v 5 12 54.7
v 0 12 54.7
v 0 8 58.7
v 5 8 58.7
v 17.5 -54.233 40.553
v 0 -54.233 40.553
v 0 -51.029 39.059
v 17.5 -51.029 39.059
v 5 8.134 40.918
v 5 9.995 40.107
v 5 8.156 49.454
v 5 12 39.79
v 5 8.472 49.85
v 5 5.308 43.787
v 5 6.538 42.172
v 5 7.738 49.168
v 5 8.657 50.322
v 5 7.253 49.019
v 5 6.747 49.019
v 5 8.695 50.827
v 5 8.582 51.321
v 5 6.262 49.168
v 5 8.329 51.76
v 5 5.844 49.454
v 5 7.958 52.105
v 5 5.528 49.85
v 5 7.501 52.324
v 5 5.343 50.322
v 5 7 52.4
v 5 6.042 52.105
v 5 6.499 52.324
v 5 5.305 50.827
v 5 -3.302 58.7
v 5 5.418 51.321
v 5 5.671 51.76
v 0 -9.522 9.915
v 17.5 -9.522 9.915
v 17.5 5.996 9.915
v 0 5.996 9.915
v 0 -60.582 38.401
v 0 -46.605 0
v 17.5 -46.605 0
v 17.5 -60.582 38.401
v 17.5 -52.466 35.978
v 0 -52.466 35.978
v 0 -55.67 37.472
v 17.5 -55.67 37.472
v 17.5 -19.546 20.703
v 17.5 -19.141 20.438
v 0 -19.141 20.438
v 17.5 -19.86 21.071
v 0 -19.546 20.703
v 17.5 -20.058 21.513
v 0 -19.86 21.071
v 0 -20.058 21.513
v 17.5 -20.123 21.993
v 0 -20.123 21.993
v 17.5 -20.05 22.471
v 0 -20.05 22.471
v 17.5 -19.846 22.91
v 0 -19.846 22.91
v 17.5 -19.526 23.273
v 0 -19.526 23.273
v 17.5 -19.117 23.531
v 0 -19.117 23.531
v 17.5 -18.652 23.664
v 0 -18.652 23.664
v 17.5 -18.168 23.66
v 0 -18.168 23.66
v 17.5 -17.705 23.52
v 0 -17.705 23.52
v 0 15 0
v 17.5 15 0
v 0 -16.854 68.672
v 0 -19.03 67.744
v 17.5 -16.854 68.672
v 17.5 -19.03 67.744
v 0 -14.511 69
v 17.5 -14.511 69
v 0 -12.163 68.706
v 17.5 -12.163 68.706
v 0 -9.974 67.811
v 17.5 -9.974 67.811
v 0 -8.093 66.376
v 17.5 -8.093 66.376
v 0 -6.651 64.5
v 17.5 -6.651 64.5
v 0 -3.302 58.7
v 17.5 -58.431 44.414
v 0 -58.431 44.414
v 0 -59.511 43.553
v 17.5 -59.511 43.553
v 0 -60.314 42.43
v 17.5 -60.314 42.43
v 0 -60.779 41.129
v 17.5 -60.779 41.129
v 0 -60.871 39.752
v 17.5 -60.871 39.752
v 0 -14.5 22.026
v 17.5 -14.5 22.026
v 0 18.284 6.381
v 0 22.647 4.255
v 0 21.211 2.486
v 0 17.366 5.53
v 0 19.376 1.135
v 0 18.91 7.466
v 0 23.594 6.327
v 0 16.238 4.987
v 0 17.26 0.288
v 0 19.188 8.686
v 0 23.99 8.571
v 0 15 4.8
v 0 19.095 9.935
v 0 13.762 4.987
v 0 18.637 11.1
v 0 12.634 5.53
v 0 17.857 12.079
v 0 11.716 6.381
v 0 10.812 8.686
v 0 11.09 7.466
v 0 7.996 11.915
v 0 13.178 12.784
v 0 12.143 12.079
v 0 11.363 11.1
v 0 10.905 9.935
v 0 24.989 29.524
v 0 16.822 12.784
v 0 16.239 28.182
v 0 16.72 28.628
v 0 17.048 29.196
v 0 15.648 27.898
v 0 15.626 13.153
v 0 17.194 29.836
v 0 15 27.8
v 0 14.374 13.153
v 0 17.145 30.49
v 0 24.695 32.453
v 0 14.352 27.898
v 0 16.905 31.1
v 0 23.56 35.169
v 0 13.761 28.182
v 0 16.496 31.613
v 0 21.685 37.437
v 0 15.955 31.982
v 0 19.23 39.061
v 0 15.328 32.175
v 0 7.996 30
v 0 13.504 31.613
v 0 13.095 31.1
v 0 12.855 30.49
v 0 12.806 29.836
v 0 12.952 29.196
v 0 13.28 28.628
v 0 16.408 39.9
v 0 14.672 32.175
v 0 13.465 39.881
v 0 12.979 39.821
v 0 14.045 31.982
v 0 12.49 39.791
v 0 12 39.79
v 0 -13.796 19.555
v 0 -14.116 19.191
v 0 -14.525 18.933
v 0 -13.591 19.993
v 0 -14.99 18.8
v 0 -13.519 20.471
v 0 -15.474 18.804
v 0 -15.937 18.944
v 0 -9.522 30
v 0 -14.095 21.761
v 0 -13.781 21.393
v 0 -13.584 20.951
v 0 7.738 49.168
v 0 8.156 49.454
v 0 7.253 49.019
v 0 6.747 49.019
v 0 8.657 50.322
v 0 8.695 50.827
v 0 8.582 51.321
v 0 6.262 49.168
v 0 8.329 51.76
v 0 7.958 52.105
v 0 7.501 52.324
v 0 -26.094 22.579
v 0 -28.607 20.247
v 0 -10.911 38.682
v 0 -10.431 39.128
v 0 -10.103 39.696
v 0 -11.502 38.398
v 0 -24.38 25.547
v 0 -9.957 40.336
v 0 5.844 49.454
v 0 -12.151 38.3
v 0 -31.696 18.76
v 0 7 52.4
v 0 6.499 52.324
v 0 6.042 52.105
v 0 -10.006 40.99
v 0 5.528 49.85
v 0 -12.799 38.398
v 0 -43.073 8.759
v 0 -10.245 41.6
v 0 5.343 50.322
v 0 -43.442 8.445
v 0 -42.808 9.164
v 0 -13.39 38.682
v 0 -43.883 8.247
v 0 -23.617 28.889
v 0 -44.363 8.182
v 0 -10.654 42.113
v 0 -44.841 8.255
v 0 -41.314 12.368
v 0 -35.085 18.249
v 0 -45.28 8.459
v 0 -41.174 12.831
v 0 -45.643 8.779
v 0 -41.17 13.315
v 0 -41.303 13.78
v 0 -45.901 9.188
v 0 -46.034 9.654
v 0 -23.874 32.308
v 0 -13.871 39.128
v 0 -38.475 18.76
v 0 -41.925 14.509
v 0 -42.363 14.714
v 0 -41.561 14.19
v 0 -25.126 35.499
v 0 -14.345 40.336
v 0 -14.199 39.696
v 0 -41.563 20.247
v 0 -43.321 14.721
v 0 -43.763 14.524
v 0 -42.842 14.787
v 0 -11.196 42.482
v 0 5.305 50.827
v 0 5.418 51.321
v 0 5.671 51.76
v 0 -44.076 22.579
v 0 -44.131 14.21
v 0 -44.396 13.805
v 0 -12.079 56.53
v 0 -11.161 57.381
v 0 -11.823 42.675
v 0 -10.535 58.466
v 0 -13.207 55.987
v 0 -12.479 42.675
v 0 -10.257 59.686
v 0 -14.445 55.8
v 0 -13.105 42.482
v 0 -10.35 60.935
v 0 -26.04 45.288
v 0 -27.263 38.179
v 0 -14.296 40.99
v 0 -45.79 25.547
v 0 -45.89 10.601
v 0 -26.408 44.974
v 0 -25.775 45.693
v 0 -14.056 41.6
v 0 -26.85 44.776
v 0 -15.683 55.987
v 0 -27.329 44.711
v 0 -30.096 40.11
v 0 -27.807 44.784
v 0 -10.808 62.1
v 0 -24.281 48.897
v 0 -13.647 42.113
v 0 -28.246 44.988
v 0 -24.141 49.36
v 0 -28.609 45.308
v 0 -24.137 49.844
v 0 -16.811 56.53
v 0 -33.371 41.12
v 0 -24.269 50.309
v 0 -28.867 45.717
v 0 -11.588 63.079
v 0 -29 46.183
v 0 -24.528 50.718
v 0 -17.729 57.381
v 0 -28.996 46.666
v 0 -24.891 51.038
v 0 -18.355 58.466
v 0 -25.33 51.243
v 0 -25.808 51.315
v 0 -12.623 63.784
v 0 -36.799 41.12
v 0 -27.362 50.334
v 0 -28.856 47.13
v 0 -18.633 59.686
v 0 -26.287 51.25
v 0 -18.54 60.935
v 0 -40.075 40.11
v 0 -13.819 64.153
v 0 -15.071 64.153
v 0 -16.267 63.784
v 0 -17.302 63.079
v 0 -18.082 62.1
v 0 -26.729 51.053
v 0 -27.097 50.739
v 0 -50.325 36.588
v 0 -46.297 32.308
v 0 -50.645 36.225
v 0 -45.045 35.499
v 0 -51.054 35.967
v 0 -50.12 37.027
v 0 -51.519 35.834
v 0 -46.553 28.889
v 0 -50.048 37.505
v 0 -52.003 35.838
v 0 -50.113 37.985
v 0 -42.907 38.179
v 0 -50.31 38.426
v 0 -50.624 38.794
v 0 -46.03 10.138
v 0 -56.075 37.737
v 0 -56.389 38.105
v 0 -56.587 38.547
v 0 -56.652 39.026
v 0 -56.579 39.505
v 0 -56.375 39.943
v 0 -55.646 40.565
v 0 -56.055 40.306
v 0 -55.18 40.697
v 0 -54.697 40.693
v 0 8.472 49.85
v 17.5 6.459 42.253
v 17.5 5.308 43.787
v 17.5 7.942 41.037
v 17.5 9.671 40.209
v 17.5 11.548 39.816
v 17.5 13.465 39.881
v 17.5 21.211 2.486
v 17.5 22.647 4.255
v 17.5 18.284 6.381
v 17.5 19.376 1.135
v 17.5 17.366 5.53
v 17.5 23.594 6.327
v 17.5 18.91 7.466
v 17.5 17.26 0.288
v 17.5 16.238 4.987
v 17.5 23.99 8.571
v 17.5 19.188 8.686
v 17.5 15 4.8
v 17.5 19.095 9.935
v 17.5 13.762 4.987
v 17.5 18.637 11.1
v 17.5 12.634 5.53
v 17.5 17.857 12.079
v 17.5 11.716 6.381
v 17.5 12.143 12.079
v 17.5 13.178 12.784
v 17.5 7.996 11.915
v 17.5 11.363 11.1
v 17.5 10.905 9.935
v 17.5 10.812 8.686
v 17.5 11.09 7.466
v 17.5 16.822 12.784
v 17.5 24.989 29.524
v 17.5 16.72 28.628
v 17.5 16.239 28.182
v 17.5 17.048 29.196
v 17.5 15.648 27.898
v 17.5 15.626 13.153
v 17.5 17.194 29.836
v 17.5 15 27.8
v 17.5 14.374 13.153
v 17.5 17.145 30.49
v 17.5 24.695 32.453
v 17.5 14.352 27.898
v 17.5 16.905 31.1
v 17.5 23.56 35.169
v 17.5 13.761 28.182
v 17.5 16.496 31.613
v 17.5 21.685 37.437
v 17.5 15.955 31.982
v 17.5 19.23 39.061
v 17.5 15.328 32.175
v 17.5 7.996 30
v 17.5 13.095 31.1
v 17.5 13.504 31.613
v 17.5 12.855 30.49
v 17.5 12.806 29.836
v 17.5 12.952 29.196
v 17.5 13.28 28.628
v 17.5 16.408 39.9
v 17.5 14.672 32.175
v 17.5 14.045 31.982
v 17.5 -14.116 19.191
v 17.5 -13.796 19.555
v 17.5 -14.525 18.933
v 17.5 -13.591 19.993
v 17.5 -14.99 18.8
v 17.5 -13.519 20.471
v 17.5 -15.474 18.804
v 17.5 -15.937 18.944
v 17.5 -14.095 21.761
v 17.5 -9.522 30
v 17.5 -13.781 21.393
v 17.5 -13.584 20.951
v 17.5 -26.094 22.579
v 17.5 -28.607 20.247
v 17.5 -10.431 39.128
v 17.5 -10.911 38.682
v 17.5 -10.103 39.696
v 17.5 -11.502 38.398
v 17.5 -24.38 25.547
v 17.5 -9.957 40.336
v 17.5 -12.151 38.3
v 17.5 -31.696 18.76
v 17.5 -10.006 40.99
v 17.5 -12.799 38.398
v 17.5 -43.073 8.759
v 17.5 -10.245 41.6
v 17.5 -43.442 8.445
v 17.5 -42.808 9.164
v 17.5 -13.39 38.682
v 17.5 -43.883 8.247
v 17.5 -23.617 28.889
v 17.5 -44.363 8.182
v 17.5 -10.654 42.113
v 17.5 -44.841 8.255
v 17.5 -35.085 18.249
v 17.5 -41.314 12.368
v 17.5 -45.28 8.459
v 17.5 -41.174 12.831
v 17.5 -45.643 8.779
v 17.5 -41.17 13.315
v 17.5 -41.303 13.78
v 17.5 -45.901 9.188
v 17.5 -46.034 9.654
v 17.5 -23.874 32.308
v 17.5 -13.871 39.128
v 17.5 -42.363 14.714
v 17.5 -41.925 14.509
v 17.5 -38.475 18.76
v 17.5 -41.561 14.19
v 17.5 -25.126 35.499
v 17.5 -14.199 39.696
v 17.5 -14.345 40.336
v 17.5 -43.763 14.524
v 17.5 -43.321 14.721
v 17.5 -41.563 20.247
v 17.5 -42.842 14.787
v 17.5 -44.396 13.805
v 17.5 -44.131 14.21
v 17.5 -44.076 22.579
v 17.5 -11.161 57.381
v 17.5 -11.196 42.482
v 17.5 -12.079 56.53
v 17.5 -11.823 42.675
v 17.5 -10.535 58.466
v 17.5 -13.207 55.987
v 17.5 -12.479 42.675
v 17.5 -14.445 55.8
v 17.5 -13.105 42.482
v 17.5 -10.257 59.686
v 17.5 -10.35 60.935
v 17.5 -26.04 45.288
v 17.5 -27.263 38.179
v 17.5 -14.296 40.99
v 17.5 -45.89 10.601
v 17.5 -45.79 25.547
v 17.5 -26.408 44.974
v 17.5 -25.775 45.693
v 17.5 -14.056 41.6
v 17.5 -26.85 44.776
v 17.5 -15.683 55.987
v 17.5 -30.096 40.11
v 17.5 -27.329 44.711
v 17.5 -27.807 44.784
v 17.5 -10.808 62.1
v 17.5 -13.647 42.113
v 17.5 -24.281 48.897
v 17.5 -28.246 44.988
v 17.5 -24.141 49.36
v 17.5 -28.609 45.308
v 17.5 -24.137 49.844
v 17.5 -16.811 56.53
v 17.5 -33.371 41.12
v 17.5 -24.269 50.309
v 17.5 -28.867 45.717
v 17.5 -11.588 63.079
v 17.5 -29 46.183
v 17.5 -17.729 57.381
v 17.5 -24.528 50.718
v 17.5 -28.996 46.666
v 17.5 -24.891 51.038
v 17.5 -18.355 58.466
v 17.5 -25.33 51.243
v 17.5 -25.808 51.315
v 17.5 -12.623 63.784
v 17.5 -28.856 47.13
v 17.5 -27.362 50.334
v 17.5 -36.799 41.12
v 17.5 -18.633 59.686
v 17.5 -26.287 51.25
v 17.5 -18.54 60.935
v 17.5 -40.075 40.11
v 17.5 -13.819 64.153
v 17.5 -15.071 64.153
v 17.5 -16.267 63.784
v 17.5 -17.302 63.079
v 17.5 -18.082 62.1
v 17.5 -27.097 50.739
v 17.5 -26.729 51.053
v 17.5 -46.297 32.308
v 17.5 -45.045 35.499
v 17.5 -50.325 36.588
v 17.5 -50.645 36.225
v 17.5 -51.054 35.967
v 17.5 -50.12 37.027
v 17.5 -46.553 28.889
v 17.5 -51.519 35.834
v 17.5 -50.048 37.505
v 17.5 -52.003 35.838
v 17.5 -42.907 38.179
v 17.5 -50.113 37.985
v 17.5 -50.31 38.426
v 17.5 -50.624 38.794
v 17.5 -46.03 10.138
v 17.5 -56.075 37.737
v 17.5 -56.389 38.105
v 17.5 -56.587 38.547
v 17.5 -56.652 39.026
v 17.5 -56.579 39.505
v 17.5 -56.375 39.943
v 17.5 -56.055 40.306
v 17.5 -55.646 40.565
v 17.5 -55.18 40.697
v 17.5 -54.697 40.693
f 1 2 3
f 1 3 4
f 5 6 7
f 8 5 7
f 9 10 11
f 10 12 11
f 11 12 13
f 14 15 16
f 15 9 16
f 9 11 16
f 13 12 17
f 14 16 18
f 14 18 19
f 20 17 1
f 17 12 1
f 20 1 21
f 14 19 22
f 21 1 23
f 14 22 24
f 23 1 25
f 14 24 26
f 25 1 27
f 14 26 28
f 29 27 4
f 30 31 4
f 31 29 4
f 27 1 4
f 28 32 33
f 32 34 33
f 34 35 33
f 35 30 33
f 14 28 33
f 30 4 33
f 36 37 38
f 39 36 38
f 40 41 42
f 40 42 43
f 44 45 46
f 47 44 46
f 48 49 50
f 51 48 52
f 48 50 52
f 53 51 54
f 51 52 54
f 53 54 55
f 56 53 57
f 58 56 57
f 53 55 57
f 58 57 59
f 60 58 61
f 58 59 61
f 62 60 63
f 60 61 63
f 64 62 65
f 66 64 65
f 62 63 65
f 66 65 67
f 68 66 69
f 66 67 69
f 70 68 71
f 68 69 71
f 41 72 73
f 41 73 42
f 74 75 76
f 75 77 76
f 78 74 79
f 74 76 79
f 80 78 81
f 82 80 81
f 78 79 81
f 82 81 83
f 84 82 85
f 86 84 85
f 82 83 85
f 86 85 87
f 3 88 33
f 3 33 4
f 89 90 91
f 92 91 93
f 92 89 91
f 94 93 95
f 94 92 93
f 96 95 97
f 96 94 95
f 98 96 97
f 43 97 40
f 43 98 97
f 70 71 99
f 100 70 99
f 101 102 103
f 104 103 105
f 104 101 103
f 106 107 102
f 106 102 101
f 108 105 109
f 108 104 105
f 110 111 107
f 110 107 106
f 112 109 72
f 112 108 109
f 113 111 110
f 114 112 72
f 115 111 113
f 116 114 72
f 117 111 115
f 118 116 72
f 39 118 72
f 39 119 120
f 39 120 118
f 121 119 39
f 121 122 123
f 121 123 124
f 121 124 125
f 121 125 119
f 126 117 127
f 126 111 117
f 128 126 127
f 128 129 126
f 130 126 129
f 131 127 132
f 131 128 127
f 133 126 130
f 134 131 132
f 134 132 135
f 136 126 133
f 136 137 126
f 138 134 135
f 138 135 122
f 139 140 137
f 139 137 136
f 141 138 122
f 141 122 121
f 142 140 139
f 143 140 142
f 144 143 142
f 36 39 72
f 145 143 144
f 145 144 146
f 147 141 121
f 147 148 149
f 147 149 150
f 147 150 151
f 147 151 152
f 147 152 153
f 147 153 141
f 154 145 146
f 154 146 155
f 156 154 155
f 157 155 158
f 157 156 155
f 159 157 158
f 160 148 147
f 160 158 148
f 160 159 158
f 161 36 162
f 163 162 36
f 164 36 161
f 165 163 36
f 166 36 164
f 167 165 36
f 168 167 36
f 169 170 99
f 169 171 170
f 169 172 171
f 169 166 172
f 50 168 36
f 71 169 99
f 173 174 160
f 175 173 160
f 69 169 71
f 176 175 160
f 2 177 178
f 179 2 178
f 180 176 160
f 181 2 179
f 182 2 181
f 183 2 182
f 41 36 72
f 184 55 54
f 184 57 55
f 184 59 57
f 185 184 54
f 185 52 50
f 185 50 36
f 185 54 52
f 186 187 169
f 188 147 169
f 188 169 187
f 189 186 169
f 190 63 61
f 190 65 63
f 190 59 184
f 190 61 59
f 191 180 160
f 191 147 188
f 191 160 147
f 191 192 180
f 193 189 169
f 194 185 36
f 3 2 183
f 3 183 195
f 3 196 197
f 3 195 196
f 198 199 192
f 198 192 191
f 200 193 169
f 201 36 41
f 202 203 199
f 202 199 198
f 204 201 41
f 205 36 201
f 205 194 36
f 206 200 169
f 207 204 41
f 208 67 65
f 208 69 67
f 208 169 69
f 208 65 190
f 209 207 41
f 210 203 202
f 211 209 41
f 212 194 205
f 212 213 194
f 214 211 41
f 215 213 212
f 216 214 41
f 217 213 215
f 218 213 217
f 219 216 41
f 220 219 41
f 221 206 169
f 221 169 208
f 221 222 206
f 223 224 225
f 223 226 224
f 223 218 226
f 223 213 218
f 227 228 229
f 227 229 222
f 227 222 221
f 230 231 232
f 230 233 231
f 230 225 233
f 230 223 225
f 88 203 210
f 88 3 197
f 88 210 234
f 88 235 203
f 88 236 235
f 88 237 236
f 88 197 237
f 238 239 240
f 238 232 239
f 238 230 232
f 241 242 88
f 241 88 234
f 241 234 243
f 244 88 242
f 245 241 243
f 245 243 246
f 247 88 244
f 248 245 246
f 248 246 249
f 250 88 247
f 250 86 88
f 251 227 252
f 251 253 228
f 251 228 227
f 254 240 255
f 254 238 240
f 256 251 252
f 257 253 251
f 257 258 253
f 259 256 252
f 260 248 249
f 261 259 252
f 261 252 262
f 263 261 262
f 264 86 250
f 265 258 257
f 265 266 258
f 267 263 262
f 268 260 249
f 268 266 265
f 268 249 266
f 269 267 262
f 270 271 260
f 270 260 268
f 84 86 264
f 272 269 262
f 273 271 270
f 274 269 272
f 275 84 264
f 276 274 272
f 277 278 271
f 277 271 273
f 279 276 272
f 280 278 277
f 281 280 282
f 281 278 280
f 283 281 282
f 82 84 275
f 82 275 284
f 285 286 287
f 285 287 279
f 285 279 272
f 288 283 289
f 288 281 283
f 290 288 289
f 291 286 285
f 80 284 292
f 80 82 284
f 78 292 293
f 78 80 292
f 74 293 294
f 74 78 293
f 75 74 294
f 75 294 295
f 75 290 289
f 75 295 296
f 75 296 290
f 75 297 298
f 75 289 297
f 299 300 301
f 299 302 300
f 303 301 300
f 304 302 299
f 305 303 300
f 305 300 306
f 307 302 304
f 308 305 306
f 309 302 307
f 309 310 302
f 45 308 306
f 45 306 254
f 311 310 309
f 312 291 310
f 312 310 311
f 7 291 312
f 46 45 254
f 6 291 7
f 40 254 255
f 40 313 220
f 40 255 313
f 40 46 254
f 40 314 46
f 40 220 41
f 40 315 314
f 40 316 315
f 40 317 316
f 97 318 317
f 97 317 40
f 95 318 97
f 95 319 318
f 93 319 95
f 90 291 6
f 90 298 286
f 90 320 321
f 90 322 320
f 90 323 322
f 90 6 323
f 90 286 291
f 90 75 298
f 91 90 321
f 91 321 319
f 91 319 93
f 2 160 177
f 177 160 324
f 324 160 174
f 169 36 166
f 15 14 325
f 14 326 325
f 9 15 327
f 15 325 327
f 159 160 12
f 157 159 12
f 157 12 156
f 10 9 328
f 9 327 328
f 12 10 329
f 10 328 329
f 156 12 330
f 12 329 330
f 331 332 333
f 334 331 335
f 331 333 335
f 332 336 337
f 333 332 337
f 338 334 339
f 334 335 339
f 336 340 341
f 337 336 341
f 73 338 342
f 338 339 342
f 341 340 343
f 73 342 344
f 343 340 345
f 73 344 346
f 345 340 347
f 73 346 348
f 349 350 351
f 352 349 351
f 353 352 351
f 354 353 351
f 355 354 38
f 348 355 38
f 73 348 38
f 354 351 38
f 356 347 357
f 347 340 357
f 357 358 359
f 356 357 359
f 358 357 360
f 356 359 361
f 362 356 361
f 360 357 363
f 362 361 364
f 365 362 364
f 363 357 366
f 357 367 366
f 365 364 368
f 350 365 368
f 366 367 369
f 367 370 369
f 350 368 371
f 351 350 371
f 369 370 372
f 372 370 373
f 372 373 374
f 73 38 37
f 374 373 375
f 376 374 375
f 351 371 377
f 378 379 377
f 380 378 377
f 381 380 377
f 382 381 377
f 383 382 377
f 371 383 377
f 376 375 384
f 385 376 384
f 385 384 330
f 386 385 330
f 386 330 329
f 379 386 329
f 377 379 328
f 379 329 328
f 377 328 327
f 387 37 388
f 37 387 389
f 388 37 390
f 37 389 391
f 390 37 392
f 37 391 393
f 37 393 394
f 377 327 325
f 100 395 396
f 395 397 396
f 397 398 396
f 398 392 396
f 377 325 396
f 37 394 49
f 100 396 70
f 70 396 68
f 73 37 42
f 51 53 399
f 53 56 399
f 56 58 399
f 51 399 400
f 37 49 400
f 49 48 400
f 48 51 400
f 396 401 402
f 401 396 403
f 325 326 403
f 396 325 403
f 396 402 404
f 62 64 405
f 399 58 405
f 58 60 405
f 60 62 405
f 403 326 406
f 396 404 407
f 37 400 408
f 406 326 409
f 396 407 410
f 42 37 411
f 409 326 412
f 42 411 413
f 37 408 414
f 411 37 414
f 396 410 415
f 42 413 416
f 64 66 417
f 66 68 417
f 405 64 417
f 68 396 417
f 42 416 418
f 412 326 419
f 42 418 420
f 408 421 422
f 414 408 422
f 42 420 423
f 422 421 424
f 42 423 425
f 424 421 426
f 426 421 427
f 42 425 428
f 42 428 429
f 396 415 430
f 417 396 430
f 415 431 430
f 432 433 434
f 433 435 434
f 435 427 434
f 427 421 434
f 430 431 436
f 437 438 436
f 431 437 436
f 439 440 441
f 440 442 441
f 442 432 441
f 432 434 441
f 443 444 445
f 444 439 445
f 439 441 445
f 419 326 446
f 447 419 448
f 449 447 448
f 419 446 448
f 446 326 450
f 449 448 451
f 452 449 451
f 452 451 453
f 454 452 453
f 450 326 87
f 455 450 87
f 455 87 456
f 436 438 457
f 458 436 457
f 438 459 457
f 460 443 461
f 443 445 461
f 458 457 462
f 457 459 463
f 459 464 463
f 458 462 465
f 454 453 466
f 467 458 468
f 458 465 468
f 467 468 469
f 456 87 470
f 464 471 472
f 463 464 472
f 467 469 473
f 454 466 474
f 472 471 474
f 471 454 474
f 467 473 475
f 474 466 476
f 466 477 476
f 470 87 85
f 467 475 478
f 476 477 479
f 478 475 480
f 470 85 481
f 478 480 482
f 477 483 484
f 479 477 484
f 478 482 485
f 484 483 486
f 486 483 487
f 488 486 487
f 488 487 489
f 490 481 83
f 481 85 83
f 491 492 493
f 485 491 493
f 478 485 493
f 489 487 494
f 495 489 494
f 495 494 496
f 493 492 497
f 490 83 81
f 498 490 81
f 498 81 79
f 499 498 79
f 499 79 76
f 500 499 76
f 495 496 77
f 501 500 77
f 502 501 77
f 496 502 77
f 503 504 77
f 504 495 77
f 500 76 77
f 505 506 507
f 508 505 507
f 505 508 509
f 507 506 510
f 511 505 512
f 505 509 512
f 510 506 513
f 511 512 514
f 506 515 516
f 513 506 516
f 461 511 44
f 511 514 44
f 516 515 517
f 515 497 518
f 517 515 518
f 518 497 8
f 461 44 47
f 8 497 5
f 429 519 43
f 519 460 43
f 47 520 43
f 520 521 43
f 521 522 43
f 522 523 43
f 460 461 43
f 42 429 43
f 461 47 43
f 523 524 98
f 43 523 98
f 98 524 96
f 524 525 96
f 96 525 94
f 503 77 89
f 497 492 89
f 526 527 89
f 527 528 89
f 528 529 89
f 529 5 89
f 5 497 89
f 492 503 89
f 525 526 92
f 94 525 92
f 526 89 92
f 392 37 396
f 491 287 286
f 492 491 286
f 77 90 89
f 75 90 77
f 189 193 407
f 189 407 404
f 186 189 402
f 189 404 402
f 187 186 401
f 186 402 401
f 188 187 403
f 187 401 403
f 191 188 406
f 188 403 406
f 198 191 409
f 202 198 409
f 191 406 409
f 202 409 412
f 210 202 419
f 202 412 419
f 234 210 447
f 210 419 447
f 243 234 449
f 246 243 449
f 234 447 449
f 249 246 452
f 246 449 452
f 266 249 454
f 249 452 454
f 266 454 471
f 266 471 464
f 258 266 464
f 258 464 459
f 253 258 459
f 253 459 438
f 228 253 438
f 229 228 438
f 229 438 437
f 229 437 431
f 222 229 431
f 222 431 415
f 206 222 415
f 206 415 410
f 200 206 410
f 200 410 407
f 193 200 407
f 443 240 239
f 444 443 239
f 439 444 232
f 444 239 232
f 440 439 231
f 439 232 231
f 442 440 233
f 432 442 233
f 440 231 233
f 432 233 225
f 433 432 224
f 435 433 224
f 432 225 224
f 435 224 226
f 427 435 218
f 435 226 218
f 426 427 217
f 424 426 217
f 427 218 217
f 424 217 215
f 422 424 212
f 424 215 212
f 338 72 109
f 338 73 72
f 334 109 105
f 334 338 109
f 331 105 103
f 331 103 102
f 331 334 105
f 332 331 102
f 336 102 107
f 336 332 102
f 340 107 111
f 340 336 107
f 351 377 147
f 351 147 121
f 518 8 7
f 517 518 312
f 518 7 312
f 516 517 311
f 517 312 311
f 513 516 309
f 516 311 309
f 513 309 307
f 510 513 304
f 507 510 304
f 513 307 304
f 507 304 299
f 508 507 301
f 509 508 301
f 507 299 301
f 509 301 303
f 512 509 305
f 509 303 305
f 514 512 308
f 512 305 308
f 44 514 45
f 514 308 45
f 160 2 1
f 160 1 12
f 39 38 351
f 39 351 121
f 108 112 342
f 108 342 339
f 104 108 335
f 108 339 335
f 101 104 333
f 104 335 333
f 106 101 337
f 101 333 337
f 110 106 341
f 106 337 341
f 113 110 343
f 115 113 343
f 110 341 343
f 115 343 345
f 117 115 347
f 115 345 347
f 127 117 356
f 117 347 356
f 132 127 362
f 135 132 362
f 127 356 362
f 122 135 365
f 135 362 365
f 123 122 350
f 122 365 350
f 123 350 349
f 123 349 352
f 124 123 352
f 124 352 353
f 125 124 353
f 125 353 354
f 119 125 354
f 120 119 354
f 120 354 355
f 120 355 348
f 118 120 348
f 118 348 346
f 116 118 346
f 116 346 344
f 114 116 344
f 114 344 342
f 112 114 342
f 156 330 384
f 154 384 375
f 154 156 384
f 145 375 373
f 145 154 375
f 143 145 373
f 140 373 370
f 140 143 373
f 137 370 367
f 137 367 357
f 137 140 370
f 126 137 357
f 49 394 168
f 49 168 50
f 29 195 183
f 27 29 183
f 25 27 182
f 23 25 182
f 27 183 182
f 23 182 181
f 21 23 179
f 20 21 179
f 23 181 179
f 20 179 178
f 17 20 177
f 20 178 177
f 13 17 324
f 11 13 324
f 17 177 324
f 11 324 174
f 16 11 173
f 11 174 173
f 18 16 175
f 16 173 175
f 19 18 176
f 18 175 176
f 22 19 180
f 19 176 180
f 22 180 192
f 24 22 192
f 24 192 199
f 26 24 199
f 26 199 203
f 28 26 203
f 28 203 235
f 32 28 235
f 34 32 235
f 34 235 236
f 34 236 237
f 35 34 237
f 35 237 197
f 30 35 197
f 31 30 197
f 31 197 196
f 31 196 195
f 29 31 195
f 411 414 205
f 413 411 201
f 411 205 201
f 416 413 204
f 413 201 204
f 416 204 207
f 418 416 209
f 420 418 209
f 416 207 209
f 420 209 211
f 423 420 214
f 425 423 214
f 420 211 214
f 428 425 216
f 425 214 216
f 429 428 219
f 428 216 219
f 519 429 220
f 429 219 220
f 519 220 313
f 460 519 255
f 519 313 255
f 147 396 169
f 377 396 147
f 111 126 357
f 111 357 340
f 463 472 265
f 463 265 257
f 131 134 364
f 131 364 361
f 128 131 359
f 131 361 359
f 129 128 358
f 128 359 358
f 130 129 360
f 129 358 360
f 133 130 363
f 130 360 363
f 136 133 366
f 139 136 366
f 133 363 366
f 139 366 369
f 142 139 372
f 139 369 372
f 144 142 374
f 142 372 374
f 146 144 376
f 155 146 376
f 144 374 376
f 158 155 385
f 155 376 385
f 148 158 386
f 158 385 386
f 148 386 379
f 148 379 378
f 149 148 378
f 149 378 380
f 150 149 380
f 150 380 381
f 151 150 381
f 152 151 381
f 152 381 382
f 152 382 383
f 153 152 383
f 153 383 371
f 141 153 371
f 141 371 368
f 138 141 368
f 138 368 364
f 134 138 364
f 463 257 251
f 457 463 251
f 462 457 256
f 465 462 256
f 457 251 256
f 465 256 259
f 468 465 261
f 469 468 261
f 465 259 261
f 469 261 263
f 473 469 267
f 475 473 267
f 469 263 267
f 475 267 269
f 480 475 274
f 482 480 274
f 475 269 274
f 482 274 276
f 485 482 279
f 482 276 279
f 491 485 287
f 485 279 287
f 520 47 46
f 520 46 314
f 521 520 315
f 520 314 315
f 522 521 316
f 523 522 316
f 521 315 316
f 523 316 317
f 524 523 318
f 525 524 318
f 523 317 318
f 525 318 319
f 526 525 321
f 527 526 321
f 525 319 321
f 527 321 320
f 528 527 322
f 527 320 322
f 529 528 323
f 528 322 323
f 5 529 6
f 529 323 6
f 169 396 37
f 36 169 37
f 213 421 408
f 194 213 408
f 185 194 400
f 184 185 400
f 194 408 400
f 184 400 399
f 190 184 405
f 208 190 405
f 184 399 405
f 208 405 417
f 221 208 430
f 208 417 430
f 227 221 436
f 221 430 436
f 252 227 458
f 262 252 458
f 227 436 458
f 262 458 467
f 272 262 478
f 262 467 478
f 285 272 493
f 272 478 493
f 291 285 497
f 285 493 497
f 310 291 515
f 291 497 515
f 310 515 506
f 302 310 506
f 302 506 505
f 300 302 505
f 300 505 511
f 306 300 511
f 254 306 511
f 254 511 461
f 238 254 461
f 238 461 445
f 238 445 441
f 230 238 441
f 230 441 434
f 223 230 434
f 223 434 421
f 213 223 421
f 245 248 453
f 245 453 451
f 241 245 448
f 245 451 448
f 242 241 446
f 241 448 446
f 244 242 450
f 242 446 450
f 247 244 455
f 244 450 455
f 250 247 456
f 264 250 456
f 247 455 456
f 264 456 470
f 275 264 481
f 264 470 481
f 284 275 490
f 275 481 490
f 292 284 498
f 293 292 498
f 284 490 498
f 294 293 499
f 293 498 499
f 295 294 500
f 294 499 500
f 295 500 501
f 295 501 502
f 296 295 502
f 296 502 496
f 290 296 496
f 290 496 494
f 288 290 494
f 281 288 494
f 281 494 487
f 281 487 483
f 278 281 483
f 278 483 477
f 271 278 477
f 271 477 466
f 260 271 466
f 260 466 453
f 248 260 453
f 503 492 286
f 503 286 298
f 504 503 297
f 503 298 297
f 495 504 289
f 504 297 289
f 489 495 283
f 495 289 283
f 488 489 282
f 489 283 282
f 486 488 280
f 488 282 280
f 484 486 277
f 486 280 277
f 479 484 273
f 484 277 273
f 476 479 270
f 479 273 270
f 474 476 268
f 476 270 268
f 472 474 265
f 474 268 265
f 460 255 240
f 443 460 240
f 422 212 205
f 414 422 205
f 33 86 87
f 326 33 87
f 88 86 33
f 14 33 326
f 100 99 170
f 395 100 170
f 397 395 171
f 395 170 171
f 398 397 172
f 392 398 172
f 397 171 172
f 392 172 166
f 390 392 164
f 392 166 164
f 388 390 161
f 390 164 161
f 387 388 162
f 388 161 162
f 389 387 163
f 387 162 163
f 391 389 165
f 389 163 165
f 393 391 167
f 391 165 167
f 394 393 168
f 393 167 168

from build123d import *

# Parameters (mm, degrees)
BOSS_EXTRUDE1_DEPTH = 17.5
BOSS_EXTRUDE2_DEPTH = 5
CUT_EXTRUDE1_DEPTH  = 97.898655256
CUT_EXTRUDE2_DEPTH  = 97.898655256
CUT_EXTRUDE3_DEPTH  = 97.898655256
CUT_EXTRUDE4_DEPTH  = 97.898655256
SKETCH7_W           = 20.085317587
SKETCH7_H           = 17.517779008
CUT_EXTRUDE5_DEPTH  = 97.898655256
HOLE1_D             = 3.4
HOLE2_D             = 8.4
HOLE3_D             = 4.4
HOLE4_D             = 23
HOLE5_D             = 8.4
HOLE6_D             = 4.4
FILLET1_R           = 8
CHAMFER3_SIZE       = 4
CHAMFER4_SIZE       = 2
FILLET2_R           = 5
FILLET3_R           = 9
FILLET4_R           = 9


with BuildPart() as part:
    # Sketch1 → Boss-Extrude1 (new body)
    with BuildSketch(Plane(origin=(0, 0, 0), x_dir=(0, -1, 0), z_dir=(-1, 0, 0))):
        with BuildLine():
            Line((11.200465877, 72.380538081), (-8.757531911, 37.812271895))
            ThreePointArc((-8.757531911, 37.812271895), (-19.547871207, 38.906001768), (-24.988655697, 29.523809524))
            Line((-24.988655697, 29.523809524), (-23.581163303, 0))
            Line((-23.581163303, 0), (46.605341047, 0))
            Line((46.605341047, 0), (62.001266902, 42.299958639))
            Line((62.001266902, 42.299958639), (11.200465877, 72.380538081))
        make_face()
    extrude(amount=-BOSS_EXTRUDE1_DEPTH)

    # Sketch2 → Boss-Extrude2 (add)
    with BuildSketch(Plane(origin=(0, 0, 0), x_dir=(0, -1, 0), z_dir=(-1, 0, 0))):
        with BuildLine():
            Line((-8.757531911, 37.812271895), (3.302003533, 58.7))
            Line((3.302003533, 58.7), (-12, 58.7))
            Line((-12, 58.7), (-12, 39.539392014))
            ThreePointArc((-12, 39.539392014), (-10.298772493, 38.82601042), (-8.757531911, 37.812271895))
        make_face()
    extrude(amount=-BOSS_EXTRUDE2_DEPTH)

    # Sketch3 → Cut-Extrude1 (cut, through all)
    with BuildSketch(Plane.ZY):
        with BuildLine():
            Line((18.944189974, -15.937202057), (20.438371168, -19.141483967))
            ThreePointArc((20.438371168, -19.141483967), (22.697545451, -19.96375616), (23.519817644, -17.704581878))
            Line((23.519817644, -17.704581878), (22.02563645, -14.500299967))
            ThreePointArc((22.02563645, -14.500299967), (19.766462167, -13.678027774), (18.944189974, -15.937202057))
        make_face()
    extrude(amount=-CUT_EXTRUDE1_DEPTH, mode=Mode.SUBTRACT)

    # Sketch4 → Cut-Extrude2 (cut, through all)
    with BuildSketch(Plane.ZY):
        with BuildLine():
            Line((48.896933411, -24.280652217), (45.692651501, -25.774833411))
            ThreePointArc((45.692651501, -25.774833411), (44.870379308, -28.034007694), (47.129553591, -28.856279887))
            Line((47.129553591, -28.856279887), (50.333835501, -27.362098693))
            ThreePointArc((50.333835501, -27.362098693), (51.156107694, -25.10292441), (48.896933411, -24.280652217))
        make_face()
    extrude(amount=-CUT_EXTRUDE2_DEPTH, mode=Mode.SUBTRACT)

    # Sketch5 → Cut-Extrude3 (cut, through all)
    with BuildSketch(Plane.ZY):
        with BuildLine():
            Line((35.977855582, -52.466015834), (37.472036775, -55.670297745))
            ThreePointArc((37.472036775, -55.670297745), (39.731211058, -56.492569938), (40.553483251, -54.233395655))
            Line((40.553483251, -54.233395655), (39.059302058, -51.029113744))
            ThreePointArc((39.059302058, -51.029113744), (36.800127775, -50.206841551), (35.977855582, -52.466015834))
        make_face()
    extrude(amount=-CUT_EXTRUDE3_DEPTH, mode=Mode.SUBTRACT)

    # Sketch6 → Cut-Extrude4 (cut, through all)
    with BuildSketch(Plane.ZY):
        with BuildLine():
            Line((10.600739814, -45.889945495), (13.805021724, -44.395764301))
            ThreePointArc((13.805021724, -44.395764301), (14.627293917, -42.136590018), (12.368119634, -41.314317825))
            Line((12.368119634, -41.314317825), (9.163837724, -42.808499019))
            ThreePointArc((9.163837724, -42.808499019), (8.341565531, -45.067673302), (10.600739814, -45.889945495))
        make_face()
    extrude(amount=-CUT_EXTRUDE4_DEPTH, mode=Mode.SUBTRACT)

    # Sketch7 → Cut-Extrude5 (cut, through all)
    with BuildSketch(Plane(origin=(17.5, 0, 0), x_dir=(0, 0, -1), z_dir=(1, 0, 0))):
        with Locations((-19.957341207, -0.762832283)):
            Rectangle(SKETCH7_W, SKETCH7_H)
    extrude(amount=-CUT_EXTRUDE5_DEPTH, mode=Mode.SUBTRACT)

    # Hole1 (through all)
    with Locations(Plane(origin=(5, 0, 0), x_dir=(0, 0, -1), z_dir=(1, 0, 0))):
        with Locations((-50.7, 7)):
            Hole(HOLE1_D / 2)

    # Hole2 (through all)
    with Locations(Plane.ZY):
        with Locations((9, 15)):
            Hole(HOLE2_D / 2)

    # Hole3 (through all)
    with Locations(Plane.ZY):
        with Locations((40.5, -12.150669091)):
            Hole(HOLE3_D / 2)

    # Hole4 (through all)
    with Locations(Plane.ZY):
        with Locations((29.748836613, -35.085298856)):
            Hole(HOLE4_D / 2)

    # Hole5 (through all)
    with Locations(Plane.ZY):
        with Locations((60, -14.444863729)):
            Hole(HOLE5_D / 2)

    # Hole6 (through all)
    with Locations(Plane.ZY):
        with Locations((30, 15)):
            Hole(HOLE6_D / 2)

    # Fillet1
    fillet1_edges = [part.edges().sort_by_distance(p)[0] for p in [
        (11.25, 8.757531911, 37.812271895),
    ]]
    fillet(fillet1_edges, radius=FILLET1_R)

    # Chamfer3
    chamfer3_edges = [part.edges().sort_by_distance(p)[0] for p in [
        (2.5, 12, 58.7),
    ]]
    chamfer(chamfer3_edges, length=CHAMFER3_SIZE)

    # Chamfer4
    chamfer4_edges = [part.edges().sort_by_distance(p)[0] for p in [
        (8.75, 7.996057221, 9.914682413),
    ]]
    chamfer(chamfer4_edges, length=CHAMFER4_SIZE)

    # Fillet2
    fillet2_edges = [part.edges().sort_by_distance(p)[0] for p in [
        (8.75, -62.001266902, 42.299958639),
    ]]
    fillet(fillet2_edges, radius=FILLET2_R)

    # Fillet3
    fillet3_edges = [part.edges().sort_by_distance(p)[0] for p in [
        (8.75, -11.200465877, 72.380538081),
    ]]
    fillet(fillet3_edges, radius=FILLET3_R)

    # Fillet4
    fillet4_edges = [part.edges().sort_by_distance(p)[0] for p in [
        (8.75, 23.581163303, 0),
    ]]
    fillet(fillet4_edges, radius=FILLET4_R)


solid = part.part
